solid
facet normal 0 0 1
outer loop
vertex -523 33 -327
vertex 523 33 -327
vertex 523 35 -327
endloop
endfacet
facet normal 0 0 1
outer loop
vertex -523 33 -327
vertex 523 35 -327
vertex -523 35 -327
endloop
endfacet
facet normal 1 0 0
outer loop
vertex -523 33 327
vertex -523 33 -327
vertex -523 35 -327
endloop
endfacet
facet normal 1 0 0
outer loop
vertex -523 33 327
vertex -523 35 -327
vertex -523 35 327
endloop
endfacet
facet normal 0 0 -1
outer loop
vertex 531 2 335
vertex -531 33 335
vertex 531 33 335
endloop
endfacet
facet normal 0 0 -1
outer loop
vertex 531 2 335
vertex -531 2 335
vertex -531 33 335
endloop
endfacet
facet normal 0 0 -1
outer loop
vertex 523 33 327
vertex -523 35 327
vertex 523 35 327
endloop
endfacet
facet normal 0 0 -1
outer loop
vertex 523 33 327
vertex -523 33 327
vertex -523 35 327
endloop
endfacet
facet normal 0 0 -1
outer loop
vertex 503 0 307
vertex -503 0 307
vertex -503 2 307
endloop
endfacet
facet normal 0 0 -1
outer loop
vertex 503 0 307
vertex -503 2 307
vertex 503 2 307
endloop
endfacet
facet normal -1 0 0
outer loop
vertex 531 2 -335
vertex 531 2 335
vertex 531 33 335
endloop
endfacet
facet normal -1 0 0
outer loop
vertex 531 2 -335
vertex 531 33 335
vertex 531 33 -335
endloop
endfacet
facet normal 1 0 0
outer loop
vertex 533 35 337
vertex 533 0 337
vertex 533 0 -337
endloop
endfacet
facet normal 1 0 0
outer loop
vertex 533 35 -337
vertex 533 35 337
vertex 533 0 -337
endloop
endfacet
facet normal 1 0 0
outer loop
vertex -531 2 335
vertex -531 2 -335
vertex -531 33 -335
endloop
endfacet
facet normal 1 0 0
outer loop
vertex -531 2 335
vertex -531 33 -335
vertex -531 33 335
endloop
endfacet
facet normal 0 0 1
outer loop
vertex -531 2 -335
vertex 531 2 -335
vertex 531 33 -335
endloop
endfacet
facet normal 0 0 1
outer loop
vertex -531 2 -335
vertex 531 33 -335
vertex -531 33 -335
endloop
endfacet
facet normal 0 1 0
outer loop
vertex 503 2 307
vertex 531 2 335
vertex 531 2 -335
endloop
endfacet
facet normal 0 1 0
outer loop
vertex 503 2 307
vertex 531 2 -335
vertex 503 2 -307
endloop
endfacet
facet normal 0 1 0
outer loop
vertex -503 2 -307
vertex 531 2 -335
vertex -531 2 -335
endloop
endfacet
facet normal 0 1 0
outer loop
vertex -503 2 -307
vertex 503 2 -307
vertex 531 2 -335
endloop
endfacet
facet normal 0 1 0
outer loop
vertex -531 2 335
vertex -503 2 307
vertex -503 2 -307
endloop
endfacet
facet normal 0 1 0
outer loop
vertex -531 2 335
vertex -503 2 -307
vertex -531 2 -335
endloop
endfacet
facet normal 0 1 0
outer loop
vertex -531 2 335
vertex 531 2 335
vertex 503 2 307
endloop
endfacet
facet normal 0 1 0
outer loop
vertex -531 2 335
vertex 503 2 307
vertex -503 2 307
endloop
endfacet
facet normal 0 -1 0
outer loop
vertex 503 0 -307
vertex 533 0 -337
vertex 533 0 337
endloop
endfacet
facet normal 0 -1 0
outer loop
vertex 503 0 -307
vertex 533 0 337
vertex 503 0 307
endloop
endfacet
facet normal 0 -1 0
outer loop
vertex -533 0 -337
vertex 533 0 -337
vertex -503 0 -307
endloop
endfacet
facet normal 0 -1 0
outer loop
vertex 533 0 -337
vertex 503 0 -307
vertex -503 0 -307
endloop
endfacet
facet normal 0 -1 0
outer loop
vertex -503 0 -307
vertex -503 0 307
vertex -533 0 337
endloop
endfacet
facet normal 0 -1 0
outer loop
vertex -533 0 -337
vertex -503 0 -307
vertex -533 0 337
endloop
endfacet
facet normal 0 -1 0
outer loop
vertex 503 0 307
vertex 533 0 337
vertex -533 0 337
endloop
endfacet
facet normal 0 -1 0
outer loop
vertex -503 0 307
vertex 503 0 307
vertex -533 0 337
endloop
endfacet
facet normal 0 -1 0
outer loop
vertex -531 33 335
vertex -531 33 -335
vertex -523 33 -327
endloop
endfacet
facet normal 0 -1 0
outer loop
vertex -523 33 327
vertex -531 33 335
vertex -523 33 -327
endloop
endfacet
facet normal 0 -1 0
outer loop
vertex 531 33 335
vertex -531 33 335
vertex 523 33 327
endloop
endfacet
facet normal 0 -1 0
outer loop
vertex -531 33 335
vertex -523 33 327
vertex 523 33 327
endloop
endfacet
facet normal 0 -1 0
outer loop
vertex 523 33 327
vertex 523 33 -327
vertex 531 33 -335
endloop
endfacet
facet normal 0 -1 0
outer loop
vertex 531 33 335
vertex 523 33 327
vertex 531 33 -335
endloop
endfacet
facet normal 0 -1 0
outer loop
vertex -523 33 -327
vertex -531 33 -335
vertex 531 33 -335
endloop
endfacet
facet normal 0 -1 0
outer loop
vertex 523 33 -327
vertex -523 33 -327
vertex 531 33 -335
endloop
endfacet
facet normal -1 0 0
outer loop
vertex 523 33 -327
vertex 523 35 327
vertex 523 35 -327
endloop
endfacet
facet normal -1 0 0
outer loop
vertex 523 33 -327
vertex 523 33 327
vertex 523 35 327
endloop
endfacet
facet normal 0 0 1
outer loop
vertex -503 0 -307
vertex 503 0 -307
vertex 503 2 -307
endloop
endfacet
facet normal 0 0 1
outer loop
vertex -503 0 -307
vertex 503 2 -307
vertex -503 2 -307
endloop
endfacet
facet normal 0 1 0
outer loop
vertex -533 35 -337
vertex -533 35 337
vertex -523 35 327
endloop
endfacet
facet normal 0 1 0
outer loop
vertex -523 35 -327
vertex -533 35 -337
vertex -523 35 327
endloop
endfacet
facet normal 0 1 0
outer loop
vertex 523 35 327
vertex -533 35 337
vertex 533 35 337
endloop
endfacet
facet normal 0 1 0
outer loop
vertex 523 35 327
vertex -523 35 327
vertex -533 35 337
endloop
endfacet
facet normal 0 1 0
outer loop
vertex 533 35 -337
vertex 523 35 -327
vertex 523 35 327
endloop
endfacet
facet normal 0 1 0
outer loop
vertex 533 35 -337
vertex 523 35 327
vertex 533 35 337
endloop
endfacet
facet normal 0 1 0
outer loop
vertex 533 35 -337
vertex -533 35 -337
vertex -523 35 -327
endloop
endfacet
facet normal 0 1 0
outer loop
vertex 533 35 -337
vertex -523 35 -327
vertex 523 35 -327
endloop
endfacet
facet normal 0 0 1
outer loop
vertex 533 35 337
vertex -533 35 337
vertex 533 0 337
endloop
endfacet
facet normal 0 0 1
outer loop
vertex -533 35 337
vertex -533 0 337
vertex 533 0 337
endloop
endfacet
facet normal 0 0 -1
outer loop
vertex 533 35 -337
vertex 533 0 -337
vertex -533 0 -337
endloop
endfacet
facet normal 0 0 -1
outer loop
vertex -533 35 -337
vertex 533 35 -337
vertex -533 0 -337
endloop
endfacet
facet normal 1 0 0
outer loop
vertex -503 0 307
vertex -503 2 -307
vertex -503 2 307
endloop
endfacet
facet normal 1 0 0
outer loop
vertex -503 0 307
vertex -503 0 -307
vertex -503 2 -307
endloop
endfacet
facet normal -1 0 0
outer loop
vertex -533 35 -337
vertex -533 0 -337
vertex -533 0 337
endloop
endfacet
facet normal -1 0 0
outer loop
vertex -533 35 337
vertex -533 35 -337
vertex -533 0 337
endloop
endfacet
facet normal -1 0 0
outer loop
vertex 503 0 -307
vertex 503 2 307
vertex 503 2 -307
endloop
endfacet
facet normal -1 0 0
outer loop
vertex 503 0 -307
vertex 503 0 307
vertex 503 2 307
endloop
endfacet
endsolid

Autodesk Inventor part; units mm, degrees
ref_plane "YZ Plane" through (0, 0, 0) normal (1, 0, 0) x (0, 1, 0)
ref_plane "XZ Plane" through (0, 0, 0) normal (0, 1, 0) x (-1, 0, 0)
ref_plane "XY Plane" through (0, 0, 0) normal (0, 0, 1) x (1, 0, 0)
sketch "Sketch1" plane through (0, 0, 0) normal (0, 1, 0) x (-1, 0, 0)
  line L0 (533, 337) -> (-533, 337)
  line L1 (-533, 337) -> (-533, -337)
  line L2 (-533, -337) -> (533, -337)
  line L3 (533, -337) -> (533, 337)
  line L4 (533, 337) -> (-533, -337) construction
  line L5 (-533, 337) -> (533, -337) construction
  line L6 (531, 335) -> (-531, 335)
  line L7 (-531, 335) -> (-531, -335)
  line L8 (-531, -335) -> (531, -335)
  line L9 (531, -335) -> (531, 335)
  line L10 (531, 335) -> (-531, -335) construction
  line L11 (-531, 335) -> (531, -335) construction
  line L12 (503, 307) -> (-503, 307)
  line L13 (-503, 307) -> (-503, -307)
  line L14 (-503, -307) -> (503, -307)
  line L15 (503, -307) -> (503, 307)
  line L16 (503, 307) -> (-503, -307) construction
  line L17 (-503, 307) -> (503, -307) construction
  point P0 (0, 0)
  dimension "d0" = 1066
  dimension "d1" = 674
  dimension "d2" = 1062
  dimension "d3" = 670
  dimension "d4" = 1006
  dimension "d5" = 614
extrude "Extrusion1" add sketch "Sketch1" along normal blind 2 contours L9 L8 L7 L6
extrude "Extrusion2" add sketch "Sketch1" along normal blind 33 contours L3 L2 L1 L0
sketch "Sketch2" plane through (0, 33, 0) normal (0, 1, 0) x (1, 0, 0)
  line L0 (-533, -337) -> (533, -337)
  line L1 (533, -337) -> (533, 337)
  line L2 (533, 337) -> (-533, 337)
  line L3 (-533, 337) -> (-533, -337)
  line L4 (-533, -337) -> (533, 337) construction
  line L5 (533, -337) -> (-533, 337) construction
  line L6 (-523, -327) -> (523, -327)
  line L7 (523, -327) -> (523, 327)
  line L8 (523, 327) -> (-523, 327)
  line L9 (-523, 327) -> (-523, -327)
  line L10 (-523, -327) -> (523, 327) construction
  line L11 (523, -327) -> (-523, 327) construction
  point P0 (0, 0)
  dimension "d10" = 1066
  dimension "d11" = 674
  dimension "d12" = 1046
  dimension "d13" = 654
extrude "Extrusion3" add sketch "Sketch2" along normal blind 2
properties part number "frame"
